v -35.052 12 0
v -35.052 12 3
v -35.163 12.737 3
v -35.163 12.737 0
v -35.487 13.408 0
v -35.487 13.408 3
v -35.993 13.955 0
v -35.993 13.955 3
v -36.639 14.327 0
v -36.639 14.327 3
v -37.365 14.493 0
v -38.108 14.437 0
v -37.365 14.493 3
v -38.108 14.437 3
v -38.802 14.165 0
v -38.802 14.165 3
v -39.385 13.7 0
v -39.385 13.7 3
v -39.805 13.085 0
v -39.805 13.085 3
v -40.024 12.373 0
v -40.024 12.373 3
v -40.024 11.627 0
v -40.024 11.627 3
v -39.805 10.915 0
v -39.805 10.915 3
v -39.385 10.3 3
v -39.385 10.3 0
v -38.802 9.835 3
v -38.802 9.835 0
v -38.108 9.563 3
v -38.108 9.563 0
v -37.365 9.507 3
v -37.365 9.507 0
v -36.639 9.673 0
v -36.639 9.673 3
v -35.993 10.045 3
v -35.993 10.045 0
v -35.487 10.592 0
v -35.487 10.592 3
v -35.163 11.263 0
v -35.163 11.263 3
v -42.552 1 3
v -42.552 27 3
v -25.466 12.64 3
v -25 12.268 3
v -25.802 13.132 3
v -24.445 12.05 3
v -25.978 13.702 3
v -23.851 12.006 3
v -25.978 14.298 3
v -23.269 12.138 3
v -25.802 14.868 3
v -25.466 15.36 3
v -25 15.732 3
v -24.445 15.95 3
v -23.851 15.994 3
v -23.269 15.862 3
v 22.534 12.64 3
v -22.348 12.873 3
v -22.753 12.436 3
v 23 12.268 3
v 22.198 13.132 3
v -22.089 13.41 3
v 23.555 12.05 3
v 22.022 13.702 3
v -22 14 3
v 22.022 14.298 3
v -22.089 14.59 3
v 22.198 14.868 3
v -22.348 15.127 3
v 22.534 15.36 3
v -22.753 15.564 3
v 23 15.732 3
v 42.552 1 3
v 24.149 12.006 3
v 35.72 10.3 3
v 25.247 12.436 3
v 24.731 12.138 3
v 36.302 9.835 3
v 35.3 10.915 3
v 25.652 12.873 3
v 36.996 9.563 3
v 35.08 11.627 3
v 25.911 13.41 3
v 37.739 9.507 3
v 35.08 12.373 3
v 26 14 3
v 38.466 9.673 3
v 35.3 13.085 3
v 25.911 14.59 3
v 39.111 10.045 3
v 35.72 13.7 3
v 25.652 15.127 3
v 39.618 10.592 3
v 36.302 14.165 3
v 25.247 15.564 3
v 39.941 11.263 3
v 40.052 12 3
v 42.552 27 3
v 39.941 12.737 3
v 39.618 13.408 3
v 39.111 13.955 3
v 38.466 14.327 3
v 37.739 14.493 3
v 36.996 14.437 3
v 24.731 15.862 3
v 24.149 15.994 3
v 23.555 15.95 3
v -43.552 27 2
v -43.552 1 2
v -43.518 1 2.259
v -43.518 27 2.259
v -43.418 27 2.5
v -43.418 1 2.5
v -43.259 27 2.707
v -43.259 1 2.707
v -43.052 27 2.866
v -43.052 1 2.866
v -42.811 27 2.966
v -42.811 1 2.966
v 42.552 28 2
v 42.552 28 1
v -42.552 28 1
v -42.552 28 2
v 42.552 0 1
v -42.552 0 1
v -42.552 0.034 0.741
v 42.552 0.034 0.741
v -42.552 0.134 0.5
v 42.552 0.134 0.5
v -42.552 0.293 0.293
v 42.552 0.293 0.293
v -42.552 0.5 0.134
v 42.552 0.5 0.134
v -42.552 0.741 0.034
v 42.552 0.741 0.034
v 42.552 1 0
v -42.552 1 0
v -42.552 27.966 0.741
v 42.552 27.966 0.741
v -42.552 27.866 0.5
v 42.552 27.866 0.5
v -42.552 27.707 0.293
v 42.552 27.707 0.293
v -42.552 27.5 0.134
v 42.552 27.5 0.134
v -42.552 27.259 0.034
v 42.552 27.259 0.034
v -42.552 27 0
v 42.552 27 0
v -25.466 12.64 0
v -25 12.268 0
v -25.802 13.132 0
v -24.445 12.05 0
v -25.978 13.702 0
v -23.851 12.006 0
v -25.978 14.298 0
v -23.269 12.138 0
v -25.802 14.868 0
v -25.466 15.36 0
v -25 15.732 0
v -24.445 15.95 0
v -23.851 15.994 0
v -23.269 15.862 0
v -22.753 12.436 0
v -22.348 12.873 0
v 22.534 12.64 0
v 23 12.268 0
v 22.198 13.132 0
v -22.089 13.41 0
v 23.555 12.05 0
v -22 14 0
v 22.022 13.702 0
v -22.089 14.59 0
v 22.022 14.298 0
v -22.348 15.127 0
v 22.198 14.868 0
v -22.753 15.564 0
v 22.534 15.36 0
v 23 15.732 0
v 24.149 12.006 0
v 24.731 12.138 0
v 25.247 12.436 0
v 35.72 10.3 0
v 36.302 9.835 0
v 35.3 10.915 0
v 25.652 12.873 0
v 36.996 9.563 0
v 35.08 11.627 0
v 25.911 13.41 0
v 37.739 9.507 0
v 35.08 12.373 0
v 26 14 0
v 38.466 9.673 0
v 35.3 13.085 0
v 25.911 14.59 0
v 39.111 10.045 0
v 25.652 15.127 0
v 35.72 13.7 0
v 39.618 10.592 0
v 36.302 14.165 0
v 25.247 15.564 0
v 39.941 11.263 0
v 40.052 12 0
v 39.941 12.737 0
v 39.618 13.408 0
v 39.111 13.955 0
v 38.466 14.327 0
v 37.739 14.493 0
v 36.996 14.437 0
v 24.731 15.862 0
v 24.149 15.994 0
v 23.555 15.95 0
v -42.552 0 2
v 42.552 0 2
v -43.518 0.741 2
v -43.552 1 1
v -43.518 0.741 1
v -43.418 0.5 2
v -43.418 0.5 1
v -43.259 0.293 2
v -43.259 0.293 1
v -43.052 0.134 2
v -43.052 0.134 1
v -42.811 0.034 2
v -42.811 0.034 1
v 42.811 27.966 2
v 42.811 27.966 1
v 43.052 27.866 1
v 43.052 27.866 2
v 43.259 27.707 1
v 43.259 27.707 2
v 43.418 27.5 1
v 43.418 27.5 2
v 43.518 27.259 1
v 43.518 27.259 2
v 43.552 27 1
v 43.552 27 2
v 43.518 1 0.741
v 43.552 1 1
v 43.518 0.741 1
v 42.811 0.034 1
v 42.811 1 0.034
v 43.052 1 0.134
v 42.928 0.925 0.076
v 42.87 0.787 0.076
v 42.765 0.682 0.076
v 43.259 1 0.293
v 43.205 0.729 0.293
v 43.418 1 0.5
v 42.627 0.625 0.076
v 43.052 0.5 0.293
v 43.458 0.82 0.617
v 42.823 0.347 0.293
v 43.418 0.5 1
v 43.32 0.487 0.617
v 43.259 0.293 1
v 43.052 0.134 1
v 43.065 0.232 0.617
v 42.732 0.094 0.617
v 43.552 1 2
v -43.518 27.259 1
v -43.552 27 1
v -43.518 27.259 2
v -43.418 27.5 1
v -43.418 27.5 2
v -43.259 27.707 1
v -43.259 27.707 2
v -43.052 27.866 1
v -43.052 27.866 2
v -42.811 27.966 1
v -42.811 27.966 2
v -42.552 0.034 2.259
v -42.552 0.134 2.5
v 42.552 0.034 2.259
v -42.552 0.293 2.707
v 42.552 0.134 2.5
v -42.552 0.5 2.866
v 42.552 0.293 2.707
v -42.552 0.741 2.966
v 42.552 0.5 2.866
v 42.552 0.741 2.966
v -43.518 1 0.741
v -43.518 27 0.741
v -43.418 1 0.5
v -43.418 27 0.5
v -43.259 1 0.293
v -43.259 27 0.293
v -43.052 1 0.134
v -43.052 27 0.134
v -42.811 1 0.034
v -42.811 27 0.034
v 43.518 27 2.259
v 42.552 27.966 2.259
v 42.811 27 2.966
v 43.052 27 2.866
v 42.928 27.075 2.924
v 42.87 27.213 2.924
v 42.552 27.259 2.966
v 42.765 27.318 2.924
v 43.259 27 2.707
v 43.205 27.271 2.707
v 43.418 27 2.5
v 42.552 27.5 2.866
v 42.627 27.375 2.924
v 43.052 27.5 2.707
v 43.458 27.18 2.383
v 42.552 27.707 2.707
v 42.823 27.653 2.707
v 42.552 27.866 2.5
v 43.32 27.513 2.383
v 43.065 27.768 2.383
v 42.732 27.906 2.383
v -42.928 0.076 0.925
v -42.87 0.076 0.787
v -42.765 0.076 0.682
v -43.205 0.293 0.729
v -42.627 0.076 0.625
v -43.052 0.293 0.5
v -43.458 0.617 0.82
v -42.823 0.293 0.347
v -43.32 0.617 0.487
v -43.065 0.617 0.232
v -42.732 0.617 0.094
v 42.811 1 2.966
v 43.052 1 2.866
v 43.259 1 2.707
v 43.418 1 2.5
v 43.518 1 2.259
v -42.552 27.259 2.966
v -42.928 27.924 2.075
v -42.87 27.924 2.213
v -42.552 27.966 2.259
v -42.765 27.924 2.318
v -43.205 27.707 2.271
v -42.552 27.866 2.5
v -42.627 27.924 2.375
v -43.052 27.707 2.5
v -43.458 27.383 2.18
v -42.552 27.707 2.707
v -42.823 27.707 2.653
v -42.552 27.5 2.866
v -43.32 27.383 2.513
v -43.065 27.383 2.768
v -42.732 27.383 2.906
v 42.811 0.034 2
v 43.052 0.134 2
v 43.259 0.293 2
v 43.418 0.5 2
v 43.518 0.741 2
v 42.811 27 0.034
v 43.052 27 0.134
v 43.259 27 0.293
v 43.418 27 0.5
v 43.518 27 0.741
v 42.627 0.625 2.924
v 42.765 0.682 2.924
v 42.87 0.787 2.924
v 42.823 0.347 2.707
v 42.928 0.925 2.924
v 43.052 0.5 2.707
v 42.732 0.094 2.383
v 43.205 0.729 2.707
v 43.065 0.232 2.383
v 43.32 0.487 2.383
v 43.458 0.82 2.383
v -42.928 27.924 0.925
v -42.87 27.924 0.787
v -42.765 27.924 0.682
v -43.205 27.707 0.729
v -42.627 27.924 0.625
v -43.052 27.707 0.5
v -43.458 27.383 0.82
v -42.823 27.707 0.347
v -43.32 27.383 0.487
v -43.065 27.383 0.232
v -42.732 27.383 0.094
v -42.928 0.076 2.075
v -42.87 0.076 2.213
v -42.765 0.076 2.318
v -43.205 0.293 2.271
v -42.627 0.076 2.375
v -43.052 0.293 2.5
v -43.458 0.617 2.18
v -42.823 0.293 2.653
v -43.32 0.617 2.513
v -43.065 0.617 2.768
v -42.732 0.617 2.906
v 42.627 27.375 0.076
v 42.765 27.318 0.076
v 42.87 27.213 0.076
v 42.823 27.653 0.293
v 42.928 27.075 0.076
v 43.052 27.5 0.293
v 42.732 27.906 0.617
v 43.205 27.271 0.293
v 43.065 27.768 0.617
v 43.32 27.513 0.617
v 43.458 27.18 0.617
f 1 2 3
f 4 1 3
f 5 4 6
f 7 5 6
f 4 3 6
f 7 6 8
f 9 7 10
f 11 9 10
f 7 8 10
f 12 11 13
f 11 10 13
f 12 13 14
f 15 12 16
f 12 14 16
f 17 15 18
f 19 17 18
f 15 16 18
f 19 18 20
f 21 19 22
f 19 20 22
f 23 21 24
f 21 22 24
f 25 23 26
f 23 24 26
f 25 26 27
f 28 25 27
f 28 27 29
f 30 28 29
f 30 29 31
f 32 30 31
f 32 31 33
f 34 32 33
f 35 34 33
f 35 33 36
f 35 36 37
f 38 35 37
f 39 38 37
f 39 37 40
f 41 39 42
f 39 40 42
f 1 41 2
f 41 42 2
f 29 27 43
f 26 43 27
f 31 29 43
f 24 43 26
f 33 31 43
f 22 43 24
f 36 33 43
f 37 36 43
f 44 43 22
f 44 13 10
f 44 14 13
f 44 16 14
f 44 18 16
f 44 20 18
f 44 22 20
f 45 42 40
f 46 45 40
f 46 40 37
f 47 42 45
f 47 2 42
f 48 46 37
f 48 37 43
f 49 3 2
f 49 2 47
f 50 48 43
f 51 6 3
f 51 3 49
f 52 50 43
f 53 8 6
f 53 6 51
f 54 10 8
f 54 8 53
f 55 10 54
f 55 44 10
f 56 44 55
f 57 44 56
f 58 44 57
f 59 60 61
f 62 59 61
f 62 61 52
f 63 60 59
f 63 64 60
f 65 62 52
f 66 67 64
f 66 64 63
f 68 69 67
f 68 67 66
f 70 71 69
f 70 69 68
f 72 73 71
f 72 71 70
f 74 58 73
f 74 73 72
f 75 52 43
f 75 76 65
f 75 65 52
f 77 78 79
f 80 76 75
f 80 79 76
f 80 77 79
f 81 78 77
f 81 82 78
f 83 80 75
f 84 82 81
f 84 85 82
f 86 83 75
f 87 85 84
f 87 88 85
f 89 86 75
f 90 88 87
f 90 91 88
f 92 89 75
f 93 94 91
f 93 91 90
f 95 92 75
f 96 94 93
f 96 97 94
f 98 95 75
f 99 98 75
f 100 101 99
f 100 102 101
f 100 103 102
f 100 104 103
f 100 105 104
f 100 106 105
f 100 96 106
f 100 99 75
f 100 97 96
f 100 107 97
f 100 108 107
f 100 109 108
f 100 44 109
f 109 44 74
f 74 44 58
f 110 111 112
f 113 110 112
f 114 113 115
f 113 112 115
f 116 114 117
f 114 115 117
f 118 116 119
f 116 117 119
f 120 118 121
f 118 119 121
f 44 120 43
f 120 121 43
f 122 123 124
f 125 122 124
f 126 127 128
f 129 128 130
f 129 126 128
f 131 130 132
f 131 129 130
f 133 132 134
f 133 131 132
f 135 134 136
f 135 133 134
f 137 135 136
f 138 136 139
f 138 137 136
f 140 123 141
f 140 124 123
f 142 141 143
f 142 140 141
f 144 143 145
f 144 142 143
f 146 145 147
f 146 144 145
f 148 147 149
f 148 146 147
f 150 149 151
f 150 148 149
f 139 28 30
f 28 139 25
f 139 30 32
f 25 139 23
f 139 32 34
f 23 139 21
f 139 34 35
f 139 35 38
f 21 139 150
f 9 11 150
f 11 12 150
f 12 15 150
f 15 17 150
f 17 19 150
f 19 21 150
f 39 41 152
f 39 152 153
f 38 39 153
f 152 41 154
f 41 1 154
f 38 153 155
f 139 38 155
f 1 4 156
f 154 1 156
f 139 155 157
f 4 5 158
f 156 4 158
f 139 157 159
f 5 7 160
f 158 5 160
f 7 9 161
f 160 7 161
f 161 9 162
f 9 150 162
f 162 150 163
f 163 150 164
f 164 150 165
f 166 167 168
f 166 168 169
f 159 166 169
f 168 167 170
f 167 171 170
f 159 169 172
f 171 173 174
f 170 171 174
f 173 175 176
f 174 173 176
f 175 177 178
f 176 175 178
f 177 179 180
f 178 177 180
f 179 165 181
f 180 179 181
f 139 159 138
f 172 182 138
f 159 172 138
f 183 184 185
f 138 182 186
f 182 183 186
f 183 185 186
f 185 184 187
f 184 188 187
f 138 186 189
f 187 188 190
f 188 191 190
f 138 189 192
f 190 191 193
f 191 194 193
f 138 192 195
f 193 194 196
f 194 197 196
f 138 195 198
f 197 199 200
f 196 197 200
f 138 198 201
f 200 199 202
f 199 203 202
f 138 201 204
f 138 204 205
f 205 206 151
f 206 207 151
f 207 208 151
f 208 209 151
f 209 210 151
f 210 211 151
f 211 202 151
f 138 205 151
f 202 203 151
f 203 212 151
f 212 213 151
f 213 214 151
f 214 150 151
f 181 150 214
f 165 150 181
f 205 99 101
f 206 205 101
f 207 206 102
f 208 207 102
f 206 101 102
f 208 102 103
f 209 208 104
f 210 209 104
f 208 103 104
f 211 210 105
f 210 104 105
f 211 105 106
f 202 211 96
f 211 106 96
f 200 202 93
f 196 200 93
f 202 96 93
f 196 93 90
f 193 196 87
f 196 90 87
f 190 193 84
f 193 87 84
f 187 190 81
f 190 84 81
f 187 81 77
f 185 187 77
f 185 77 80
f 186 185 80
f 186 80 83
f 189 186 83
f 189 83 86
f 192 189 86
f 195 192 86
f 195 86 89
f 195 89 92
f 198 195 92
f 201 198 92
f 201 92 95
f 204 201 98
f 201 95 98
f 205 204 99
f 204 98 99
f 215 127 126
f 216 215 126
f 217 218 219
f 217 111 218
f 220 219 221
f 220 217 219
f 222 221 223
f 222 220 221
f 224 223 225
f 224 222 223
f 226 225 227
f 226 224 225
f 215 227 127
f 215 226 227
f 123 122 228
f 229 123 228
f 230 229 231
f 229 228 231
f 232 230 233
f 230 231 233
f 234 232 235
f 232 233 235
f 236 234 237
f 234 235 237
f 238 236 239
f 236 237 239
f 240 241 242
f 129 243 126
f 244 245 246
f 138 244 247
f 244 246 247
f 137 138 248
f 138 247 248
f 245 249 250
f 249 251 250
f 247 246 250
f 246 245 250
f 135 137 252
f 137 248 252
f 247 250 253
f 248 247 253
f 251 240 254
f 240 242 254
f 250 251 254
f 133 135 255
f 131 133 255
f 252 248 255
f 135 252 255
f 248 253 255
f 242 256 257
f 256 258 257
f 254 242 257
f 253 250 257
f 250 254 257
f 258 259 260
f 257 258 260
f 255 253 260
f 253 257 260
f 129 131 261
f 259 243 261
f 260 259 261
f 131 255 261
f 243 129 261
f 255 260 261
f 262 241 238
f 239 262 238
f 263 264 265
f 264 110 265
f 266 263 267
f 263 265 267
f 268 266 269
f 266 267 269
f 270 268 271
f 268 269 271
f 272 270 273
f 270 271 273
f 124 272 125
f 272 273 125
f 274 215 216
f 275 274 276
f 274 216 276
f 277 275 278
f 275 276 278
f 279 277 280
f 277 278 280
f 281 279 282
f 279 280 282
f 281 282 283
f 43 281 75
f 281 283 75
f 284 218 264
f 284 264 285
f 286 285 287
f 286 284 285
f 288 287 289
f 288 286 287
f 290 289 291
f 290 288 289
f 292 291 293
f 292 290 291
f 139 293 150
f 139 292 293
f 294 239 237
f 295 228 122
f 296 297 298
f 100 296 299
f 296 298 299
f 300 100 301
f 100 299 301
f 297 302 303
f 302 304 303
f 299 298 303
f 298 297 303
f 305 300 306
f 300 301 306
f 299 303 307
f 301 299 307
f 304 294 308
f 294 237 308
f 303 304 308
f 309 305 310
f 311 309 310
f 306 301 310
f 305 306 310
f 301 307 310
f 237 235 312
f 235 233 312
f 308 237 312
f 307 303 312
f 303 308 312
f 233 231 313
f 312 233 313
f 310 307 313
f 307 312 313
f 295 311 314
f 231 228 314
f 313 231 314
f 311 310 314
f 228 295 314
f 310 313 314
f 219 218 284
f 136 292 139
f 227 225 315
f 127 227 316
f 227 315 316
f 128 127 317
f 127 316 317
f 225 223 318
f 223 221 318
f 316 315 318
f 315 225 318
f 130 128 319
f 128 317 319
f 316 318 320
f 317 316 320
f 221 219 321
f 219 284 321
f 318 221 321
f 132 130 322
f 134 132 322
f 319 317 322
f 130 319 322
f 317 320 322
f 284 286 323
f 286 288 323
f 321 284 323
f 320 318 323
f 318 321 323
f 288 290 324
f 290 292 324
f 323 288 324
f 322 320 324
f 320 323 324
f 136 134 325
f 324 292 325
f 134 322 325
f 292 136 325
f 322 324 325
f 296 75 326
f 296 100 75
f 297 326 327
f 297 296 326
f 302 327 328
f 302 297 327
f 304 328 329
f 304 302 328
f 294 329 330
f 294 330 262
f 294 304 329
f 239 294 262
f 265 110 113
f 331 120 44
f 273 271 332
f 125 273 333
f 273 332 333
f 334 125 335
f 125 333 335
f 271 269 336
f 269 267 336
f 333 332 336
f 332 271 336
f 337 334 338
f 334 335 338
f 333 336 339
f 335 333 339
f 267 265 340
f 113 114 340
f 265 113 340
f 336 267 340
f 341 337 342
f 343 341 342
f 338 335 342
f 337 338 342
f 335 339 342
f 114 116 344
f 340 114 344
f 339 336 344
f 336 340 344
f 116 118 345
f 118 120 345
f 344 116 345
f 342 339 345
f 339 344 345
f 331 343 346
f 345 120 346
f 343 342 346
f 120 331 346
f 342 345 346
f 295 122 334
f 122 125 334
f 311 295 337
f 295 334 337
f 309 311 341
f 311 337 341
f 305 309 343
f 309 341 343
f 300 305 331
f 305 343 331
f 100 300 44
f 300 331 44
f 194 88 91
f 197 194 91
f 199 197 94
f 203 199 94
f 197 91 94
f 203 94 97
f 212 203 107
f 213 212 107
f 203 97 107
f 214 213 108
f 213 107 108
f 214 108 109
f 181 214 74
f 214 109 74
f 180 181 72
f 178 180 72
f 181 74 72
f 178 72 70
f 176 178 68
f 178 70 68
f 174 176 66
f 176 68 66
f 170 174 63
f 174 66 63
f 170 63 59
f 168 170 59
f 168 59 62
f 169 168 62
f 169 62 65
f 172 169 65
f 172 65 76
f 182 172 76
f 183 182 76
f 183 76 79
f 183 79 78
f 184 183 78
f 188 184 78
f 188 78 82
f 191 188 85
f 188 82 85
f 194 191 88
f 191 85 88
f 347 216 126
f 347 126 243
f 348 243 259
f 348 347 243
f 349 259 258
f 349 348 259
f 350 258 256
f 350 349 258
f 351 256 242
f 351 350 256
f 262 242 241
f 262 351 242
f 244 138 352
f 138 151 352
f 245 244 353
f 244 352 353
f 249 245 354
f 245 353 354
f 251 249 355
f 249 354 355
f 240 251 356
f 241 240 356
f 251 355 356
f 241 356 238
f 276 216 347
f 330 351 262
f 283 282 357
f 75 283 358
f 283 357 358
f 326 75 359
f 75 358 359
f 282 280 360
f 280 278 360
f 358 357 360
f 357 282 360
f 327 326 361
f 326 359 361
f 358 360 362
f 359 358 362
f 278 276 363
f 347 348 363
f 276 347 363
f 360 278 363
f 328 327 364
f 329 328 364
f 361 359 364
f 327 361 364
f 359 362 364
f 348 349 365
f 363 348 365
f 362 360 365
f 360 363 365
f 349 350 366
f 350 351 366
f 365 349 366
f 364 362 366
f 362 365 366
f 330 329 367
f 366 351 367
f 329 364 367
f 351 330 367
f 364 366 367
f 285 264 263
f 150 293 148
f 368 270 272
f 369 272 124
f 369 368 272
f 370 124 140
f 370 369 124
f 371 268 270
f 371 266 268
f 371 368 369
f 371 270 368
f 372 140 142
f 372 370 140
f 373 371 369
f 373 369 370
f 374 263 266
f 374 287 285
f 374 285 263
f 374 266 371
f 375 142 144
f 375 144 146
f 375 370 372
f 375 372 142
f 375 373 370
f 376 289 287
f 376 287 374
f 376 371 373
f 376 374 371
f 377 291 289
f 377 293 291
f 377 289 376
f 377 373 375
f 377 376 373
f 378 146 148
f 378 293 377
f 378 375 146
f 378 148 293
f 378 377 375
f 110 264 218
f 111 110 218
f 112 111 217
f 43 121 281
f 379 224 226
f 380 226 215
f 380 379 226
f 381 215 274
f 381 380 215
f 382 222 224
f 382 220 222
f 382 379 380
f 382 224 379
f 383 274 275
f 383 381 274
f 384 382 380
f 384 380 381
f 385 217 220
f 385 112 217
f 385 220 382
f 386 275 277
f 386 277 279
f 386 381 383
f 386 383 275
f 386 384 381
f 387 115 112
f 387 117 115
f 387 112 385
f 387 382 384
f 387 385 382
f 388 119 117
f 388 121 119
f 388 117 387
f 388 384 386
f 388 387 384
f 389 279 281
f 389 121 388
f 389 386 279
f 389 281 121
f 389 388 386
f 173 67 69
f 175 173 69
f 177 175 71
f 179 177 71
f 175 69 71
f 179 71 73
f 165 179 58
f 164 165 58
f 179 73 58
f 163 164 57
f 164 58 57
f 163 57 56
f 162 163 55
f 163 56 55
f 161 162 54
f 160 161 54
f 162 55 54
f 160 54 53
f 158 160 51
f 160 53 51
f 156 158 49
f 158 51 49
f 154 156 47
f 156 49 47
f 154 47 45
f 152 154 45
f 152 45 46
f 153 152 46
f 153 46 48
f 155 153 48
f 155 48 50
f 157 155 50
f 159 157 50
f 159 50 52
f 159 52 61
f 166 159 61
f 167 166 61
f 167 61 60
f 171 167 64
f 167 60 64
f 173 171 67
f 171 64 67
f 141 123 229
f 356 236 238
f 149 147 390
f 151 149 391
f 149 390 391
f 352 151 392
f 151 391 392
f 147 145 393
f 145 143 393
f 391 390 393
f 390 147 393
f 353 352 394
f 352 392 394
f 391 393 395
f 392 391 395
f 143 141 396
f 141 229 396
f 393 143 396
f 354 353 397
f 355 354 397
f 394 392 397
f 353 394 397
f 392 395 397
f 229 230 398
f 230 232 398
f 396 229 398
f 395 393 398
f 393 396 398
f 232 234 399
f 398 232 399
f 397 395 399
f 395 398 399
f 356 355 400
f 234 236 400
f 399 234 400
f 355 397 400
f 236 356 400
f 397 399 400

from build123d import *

# Parameters (mm, degrees)
AUFSATZ_LINEAR_AUSTRAGEN1_DEPTH = 3
SKIZZE3_R                       = 2.5
SCHNITT_LINEAR_AUSTRAGEN1_DEPTH = 3
SKIZZE6_R                       = 2
SCHNITT_LINEAR_AUSTRAGEN3_DEPTH = 3
FILLET1_R                       = 1


with BuildPart() as part:
    # Skizze1 → Aufsatz-Linear austragen1 (new body)
    with BuildSketch(Plane.XY):
        Polygon((-37.552187815, 28), (-43.552187815, 28), (-43.552187815, 0), (-37.552187815, 0), (37.552187815, 0), (43.552187815, 0), (43.552187815, 28), (37.552187815, 28), align=None)
    extrude(amount=AUFSATZ_LINEAR_AUSTRAGEN1_DEPTH)

    # Skizze3 → Schnitt-Linear austragen1 (cut)
    with BuildSketch(Plane.XY.offset(3)):
        with Locations((-37.552187815, 12)):
            Circle(SKIZZE3_R)
        with Locations((37.552187815, 12)):
            Circle(SKIZZE3_R)
    extrude(amount=-SCHNITT_LINEAR_AUSTRAGEN1_DEPTH, mode=Mode.SUBTRACT)

    # Skizze6 → Schnitt-Linear austragen3 (cut)
    with BuildSketch(Plane.XY.offset(3)):
        with Locations((-24, 14)):
            Circle(SKIZZE6_R)
        with Locations((24, 14)):
            Circle(SKIZZE6_R)
    extrude(amount=-SCHNITT_LINEAR_AUSTRAGEN3_DEPTH, mode=Mode.SUBTRACT)

    # Fillet1
    fillet1_edges = [part.edges().sort_by_distance(p)[0] for p in [
        (-43.552187815, 14, 0),
        (-43.552187815, 14, 3),
        (43.552187815, 28, 1.5),
        (43.552187815, 0, 1.5),
        (-43.552187815, 0, 1.5),
        (-43.552187815, 28, 1.5),
        (0, 0, 3),
        (43.552187815, 14, 3),
        (0, 28, 3),
        (0, 28, 0),
        (43.552187815, 14, 0),
        (0, 0, 0),
    ]]
    fillet(fillet1_edges, radius=FILLET1_R)


solid = part.part
